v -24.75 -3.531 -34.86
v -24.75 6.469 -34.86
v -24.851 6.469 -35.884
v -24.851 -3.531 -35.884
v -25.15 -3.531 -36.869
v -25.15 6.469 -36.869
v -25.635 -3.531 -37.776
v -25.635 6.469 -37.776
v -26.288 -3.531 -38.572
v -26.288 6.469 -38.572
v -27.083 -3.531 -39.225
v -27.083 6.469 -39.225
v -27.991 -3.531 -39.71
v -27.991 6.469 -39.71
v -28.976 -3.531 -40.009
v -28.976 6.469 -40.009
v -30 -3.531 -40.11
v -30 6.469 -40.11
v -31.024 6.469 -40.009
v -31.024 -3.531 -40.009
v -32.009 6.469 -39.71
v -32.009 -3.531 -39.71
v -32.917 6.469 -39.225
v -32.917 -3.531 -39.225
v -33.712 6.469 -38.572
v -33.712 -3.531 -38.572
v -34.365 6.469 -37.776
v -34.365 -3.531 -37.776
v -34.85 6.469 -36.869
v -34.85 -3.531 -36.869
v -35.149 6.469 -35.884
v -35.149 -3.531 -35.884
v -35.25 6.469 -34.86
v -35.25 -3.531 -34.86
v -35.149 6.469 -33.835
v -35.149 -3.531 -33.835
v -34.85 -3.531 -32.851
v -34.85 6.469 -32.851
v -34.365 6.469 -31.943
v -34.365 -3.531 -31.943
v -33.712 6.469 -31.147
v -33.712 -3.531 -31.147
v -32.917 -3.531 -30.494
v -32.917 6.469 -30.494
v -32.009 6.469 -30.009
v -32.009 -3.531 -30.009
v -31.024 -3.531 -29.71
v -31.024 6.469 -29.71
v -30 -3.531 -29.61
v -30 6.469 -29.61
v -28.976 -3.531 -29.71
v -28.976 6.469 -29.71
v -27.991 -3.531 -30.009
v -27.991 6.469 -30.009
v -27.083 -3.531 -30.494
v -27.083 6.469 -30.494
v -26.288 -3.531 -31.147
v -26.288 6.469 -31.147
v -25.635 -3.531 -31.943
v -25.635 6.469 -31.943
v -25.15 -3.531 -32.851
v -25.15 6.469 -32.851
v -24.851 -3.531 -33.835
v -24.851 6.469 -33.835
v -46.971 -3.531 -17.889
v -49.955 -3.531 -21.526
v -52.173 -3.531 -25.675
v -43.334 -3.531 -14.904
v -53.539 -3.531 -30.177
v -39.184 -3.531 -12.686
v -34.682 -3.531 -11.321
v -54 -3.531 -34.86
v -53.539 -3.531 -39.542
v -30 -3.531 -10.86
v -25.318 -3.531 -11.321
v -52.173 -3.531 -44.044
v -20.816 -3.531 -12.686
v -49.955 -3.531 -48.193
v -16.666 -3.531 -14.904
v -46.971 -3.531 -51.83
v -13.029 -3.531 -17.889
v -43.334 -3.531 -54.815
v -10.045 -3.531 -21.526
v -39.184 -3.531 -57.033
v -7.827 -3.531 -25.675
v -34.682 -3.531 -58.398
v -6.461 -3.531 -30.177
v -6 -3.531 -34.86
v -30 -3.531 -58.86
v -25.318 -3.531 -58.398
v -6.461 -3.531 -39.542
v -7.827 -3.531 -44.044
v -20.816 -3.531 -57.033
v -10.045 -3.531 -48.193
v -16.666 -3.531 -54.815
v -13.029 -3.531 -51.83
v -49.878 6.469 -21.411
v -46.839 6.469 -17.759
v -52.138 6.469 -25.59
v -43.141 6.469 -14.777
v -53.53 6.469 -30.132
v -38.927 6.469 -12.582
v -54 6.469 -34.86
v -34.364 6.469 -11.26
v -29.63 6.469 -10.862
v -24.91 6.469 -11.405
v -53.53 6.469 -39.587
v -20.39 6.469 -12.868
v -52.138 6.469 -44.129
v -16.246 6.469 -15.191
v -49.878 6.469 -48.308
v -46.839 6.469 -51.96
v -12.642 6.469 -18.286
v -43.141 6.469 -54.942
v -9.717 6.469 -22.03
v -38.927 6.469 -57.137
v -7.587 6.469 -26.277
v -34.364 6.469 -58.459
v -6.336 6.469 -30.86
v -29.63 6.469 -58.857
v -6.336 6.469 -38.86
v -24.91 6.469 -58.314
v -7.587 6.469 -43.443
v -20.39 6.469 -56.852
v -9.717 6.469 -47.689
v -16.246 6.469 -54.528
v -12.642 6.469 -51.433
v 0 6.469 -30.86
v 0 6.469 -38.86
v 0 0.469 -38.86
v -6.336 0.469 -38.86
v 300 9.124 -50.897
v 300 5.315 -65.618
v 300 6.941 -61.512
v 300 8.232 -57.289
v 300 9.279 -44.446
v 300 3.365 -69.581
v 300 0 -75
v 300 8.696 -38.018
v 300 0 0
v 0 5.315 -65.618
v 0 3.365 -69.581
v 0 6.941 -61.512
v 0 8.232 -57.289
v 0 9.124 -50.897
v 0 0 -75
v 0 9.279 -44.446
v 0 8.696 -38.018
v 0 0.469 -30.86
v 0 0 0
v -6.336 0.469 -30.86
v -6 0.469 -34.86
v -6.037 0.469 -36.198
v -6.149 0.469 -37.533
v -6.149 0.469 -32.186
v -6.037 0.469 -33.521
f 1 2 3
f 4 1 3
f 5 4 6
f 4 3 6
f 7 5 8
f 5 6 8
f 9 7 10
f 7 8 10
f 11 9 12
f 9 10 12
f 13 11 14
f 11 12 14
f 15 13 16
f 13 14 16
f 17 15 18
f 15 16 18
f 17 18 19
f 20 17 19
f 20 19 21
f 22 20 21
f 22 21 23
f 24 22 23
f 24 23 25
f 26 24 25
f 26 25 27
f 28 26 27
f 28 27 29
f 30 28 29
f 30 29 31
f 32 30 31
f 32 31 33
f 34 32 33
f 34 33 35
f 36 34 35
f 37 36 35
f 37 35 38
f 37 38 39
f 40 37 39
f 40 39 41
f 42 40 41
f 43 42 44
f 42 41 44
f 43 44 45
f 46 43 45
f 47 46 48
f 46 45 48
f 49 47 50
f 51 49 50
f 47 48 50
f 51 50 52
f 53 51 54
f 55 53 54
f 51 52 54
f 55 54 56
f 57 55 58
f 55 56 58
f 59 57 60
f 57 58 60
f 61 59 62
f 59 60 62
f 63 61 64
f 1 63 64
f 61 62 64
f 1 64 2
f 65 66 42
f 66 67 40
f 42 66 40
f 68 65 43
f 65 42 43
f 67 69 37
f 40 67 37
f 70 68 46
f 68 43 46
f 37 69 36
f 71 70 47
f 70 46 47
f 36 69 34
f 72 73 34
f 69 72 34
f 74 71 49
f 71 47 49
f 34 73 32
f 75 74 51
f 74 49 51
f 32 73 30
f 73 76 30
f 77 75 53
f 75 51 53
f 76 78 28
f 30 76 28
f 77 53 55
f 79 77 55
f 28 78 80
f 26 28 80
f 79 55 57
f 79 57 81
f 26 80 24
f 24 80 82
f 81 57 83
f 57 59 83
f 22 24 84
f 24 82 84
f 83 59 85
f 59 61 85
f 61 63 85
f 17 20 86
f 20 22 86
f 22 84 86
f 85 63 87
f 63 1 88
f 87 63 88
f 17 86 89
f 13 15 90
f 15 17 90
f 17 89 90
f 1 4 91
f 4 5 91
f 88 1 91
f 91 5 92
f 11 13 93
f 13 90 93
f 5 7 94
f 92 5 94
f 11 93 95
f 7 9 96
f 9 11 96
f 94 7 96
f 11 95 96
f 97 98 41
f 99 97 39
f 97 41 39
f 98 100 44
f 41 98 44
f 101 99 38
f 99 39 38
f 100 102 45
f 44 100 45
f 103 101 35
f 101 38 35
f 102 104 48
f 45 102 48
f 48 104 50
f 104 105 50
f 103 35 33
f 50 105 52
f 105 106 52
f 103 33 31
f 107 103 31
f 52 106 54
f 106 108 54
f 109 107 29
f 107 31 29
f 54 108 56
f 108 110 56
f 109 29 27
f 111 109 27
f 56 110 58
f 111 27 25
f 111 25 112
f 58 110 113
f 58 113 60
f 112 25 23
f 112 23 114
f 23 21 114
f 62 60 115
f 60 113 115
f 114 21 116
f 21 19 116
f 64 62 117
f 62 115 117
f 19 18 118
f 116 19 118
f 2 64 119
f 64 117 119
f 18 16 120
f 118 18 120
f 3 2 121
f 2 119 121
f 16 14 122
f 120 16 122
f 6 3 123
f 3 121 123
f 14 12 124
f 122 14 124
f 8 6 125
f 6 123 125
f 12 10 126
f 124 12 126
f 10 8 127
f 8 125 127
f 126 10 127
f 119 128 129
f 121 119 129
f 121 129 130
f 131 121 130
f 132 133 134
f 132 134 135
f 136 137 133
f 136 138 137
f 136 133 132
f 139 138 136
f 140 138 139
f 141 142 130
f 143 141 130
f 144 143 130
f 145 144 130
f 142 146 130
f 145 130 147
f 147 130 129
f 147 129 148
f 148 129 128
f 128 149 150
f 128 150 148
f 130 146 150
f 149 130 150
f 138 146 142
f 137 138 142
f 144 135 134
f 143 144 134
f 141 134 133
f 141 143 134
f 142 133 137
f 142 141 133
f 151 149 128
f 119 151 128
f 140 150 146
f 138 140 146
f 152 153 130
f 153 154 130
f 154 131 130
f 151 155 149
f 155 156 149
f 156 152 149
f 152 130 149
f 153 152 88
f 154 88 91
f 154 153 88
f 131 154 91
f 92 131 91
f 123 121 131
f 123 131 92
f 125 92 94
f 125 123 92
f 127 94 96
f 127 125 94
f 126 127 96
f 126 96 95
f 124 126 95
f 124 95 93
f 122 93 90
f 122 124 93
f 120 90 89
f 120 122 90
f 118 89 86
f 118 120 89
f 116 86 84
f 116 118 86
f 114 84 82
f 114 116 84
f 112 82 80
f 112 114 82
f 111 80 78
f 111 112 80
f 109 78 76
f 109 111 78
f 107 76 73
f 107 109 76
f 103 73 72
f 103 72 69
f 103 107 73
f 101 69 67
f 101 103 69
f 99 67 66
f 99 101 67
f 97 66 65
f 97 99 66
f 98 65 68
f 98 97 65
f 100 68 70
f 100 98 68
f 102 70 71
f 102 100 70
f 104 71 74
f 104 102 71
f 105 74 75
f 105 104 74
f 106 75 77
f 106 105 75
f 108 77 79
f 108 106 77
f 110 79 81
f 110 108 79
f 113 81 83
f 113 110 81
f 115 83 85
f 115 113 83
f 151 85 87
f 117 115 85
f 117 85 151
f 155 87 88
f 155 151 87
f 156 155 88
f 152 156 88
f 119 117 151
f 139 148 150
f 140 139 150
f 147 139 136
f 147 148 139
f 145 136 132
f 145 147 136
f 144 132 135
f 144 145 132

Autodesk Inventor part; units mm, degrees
ref_plane "YZ Plane" through (0, 0, 0) normal (1, 0, 0) x (0, 1, 0)
ref_plane "XZ Plane" through (0, 0, 0) normal (0, 1, 0) x (-1, 0, 0)
ref_plane "XY Plane" through (0, 0, 0) normal (0, 0, 1) x (1, 0, 0)
sketch "Sketch1" plane through (0, 0, 0) normal (1, 0, 0) x (0, 1, 0)
  line L0 (0, 0) -> (0, -75)
  line L1 (0, -75) -> (3.365, -69.5807)
  line L2 (8.696, -38.0184) -> (0, 0)
  arc A0 (0, -75) -> (5.1288, -67.1329) centre (-33.3696, -47.6401) ccw
  arc A1 (0, -75) -> (8.2317, -57.2892) centre (-44.922, -43.3526) ccw
  arc A2 (8.2317, -57.2892) -> (8.696, -38.0184) centre (-47.0413, -46.3165) ccw
  point P0 (13.3125, -58.2014)
  dimension "d0" = 75
extrude "Extrusion1" add sketch "Sketch1" along normal blind 300 contours L2 A2 A1 L1 L0
sketch "Sketch2" plane through (0, 0, 0) normal (-1, 0, 0) x (0, 0, 1)
  line L0 (-99.8775, 0) -> (-66.8775, 0)
  line L1 (0, 0) -> (-75, 0) projected
  line L2 (-30.8596, 6.469) -> (-38.8596, 6.469)
  line L3 (-38.8596, 6.469) -> (-38.8596, 0.469)
  line L4 (-38.8596, 0.469) -> (-30.8596, 0.469)
  line L5 (-30.8596, 0.469) -> (-30.8596, 6.469)
  arc A0 (-87.3159, 9.7453) -> (-75, 0) centre (-67.8231, -28.7531) ccw projected
  line L6 (-75, 0) -> (-36, 0)
  dimension "d3" = 33
  dimension "d4" = 8
  dimension "d5" = 6
  dimension "d15" = 39
extrude "Extrusion2" add sketch "Sketch2" along normal blind 30
sketch "Sketch3" plane through (0, 6.469, -56.2845) normal (0, 1, 0) x (1, 0, 0)
  line L0 (-30, -17.4249) -> (-30, -25.4249) projected
  circle A0 centre (-30, -21.4249) radius 24
  circle A1 centre (-30, -21.4249) radius 5.25
  point P0 (0, -56.2845)
  dimension "d8" = 48
  dimension "d9" = 10.5
extrude "Extrusion3" add sketch "Sketch3" against normal blind 10
sketch "Sketch4" plane through (0, 6.469, -56.2845) normal (0, 1, 0) x (1, 0, 0)
  line L0 (-30, -17.4249) -> (-30, -25.4249) projected
  circle A0 centre (-30, -21.4249) radius 5.25
  point P0 (0, -56.2845)
  dimension "d12" = 10.5
extrude "Extrusion4" cut sketch "Sketch4" against normal blind 30
properties part number "elevator"
